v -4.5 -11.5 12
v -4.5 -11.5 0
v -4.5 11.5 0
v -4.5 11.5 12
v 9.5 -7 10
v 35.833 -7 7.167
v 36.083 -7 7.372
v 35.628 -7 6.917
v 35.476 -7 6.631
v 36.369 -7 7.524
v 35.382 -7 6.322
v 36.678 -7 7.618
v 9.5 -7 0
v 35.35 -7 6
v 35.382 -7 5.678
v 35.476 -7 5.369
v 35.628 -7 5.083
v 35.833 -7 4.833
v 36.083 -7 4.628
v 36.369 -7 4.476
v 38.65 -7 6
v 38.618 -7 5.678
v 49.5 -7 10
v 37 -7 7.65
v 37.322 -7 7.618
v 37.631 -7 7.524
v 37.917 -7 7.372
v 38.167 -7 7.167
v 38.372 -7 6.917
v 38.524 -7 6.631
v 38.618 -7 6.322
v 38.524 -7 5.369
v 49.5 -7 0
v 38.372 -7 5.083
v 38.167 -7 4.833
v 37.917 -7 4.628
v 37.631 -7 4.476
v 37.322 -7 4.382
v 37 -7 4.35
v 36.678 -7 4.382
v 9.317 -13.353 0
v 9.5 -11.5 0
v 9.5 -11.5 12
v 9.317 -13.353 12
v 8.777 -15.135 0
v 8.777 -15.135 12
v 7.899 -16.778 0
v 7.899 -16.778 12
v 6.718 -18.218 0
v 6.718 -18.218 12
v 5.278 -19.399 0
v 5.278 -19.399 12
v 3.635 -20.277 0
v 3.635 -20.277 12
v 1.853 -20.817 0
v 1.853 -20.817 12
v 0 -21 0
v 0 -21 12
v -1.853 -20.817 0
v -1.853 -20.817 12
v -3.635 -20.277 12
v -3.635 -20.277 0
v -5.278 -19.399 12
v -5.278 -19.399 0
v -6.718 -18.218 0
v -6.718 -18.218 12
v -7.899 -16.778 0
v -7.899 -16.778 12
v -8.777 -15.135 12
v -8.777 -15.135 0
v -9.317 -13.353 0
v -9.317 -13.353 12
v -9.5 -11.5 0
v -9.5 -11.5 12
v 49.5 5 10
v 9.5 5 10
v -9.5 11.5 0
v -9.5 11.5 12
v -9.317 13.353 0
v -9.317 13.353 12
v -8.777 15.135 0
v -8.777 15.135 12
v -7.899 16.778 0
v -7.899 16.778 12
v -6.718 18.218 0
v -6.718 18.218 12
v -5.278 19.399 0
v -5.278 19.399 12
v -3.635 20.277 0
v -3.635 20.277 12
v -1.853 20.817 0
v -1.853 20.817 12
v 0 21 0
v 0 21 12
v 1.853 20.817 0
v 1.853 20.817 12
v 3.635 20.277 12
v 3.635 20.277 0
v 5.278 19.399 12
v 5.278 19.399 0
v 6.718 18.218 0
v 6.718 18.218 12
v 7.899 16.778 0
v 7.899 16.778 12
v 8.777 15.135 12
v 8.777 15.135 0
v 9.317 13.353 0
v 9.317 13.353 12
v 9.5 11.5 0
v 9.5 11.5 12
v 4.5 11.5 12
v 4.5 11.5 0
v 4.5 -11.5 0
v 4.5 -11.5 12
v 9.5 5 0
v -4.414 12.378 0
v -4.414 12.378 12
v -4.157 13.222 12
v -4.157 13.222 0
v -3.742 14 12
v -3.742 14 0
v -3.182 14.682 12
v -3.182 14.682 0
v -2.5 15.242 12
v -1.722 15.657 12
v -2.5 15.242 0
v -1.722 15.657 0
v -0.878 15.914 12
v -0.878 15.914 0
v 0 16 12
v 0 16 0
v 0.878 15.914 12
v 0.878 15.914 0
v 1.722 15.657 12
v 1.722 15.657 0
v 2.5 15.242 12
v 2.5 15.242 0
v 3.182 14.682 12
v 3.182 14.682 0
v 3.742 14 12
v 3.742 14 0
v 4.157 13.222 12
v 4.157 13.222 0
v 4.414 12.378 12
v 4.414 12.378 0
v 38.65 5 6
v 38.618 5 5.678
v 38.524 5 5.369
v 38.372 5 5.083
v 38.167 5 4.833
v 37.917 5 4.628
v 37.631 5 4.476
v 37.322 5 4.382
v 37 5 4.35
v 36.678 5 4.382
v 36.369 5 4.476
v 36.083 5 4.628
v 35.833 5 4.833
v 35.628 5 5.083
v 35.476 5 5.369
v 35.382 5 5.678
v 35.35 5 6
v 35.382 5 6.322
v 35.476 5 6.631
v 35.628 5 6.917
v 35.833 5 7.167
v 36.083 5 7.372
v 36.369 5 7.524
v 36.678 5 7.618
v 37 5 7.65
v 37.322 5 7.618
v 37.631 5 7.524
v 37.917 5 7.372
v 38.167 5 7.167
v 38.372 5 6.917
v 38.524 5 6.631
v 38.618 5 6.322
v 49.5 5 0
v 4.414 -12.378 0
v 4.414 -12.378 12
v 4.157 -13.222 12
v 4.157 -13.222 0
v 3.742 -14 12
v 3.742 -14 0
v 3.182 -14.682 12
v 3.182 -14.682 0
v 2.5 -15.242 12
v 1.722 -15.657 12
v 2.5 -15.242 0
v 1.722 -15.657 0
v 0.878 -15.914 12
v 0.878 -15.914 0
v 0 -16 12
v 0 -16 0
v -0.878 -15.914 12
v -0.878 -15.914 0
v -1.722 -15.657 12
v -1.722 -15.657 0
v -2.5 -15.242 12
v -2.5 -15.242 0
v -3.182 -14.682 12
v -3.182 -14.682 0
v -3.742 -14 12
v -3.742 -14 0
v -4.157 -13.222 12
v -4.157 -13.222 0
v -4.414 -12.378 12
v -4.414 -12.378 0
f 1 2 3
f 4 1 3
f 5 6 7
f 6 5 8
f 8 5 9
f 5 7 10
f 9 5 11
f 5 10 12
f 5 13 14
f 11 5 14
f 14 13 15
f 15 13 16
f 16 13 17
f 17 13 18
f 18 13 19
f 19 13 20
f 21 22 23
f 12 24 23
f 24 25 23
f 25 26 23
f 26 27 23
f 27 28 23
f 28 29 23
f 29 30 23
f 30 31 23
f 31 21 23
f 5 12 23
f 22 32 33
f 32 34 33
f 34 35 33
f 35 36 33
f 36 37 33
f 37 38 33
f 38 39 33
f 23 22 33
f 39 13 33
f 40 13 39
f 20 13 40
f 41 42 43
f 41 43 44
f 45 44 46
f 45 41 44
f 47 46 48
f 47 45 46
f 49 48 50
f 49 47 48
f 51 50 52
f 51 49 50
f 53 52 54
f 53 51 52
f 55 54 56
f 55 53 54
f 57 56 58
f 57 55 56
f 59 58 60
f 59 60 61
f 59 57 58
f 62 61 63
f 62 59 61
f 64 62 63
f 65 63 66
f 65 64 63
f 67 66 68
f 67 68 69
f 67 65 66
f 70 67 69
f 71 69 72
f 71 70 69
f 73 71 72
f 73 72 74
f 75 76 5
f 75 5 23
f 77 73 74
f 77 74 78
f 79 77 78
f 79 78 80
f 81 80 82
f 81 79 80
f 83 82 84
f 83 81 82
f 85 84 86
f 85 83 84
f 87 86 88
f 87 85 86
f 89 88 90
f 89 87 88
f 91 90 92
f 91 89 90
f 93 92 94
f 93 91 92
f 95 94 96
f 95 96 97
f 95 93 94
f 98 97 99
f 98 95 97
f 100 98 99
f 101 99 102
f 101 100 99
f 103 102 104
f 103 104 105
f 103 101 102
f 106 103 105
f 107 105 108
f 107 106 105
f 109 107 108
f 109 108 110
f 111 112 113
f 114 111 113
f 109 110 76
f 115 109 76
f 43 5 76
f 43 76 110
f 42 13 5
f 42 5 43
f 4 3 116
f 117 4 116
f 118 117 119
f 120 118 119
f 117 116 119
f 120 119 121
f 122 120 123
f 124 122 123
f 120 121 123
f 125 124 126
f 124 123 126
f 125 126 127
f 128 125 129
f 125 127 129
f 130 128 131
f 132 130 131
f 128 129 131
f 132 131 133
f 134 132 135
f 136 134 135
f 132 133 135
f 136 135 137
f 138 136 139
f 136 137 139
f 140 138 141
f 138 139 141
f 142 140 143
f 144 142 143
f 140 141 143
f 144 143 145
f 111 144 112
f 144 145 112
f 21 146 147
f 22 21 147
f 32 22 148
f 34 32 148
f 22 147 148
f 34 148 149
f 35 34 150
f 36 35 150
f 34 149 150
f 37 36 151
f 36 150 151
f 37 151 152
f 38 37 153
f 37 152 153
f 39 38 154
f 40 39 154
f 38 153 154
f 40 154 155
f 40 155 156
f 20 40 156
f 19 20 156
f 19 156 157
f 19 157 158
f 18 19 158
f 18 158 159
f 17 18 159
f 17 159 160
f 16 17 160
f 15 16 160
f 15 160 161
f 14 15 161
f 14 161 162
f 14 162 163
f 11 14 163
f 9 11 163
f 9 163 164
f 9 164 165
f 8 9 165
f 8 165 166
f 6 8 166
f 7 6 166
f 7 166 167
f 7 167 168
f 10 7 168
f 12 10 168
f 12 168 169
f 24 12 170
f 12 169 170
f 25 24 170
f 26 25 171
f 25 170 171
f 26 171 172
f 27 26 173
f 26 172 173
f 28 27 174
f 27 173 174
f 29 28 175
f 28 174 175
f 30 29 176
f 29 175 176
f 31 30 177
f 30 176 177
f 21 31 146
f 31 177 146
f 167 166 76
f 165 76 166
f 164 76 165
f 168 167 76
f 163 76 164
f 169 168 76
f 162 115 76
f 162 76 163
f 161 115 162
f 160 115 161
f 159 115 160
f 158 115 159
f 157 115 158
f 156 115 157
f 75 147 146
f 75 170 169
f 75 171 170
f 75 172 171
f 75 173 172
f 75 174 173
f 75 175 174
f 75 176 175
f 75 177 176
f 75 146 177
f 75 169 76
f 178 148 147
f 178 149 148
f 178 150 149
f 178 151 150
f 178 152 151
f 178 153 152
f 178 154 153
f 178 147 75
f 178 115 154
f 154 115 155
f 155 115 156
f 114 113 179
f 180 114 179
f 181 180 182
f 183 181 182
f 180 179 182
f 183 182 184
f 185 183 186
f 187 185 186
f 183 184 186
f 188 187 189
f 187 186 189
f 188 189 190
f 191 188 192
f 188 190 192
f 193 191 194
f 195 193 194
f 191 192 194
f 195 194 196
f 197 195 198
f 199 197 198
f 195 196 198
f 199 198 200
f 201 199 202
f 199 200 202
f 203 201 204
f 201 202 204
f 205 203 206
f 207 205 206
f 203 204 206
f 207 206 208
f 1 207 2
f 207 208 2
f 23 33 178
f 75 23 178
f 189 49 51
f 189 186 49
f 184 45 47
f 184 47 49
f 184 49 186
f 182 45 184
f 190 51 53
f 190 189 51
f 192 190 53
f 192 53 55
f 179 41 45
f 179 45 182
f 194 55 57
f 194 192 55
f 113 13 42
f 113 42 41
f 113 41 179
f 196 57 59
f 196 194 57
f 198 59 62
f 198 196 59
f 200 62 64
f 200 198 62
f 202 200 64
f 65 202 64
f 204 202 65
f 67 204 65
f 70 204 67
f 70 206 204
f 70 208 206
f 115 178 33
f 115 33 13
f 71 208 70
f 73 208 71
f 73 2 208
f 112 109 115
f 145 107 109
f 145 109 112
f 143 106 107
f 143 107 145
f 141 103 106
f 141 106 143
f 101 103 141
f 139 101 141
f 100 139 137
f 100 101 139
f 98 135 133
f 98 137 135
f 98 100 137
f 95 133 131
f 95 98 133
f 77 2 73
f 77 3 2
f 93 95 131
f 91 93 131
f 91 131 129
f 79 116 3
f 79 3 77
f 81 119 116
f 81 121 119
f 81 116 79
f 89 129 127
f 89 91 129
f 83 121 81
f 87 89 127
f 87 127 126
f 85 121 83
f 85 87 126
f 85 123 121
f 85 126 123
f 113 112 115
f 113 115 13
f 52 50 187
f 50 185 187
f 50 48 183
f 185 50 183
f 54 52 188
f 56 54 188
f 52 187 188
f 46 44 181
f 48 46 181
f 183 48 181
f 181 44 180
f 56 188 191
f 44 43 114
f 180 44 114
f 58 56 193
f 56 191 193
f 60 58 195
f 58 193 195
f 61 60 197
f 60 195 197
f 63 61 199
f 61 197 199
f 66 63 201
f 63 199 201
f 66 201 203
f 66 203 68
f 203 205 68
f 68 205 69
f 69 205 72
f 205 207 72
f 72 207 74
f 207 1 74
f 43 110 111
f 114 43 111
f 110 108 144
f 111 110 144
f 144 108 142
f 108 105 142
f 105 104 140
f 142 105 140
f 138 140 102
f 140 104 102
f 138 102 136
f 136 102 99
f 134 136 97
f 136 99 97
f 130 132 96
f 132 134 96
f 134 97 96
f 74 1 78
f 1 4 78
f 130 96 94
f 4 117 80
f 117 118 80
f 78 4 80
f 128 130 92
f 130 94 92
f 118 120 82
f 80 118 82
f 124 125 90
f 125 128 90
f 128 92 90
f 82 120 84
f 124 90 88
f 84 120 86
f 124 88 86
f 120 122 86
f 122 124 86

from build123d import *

# Parameters (mm, degrees)
BOSS_EXTRUDE1_DEPTH = 12
CUT_EXTRUDE1_DEPTH  = 26.98557292
SKETCH4_W           = 40
SKETCH4_H           = 12
BOSS_EXTRUDE2_DEPTH = 10
M4_TAPPED_HOLE1_D   = 3.3


with BuildPart() as part:
    # Sketch3 → Boss-Extrude1 (new body)
    with BuildSketch(Plane.XY):
        with BuildLine():
            Line((9.5, 11.5), (9.5, -11.5))
            ThreePointArc((9.5, -11.5), (0, -21), (-9.5, -11.5))
            Line((-9.5, -11.5), (-9.5, 11.5))
            ThreePointArc((-9.5, 11.5), (0, 21), (9.5, 11.5))
        make_face()
    extrude(amount=BOSS_EXTRUDE1_DEPTH)

    # Sketch1 → Cut-Extrude1 (cut, through all)
    with BuildSketch(Plane.XY):
        with BuildLine():
            Line((4.5, 11.5), (4.5, -11.5))
            ThreePointArc((4.5, -11.5), (0, -16), (-4.5, -11.5))
            Line((-4.5, -11.5), (-4.5, 11.5))
            ThreePointArc((-4.5, 11.5), (0, 16), (4.5, 11.5))
        make_face()
    extrude(amount=CUT_EXTRUDE1_DEPTH, mode=Mode.SUBTRACT)

    # Sketch4 → Boss-Extrude2 (add)
    with BuildSketch(Plane.XY):
        with Locations((29.5, -1)):
            Rectangle(SKETCH4_W, SKETCH4_H)
    extrude(amount=BOSS_EXTRUDE2_DEPTH)

    # M4 Tapped Hole1 (through all)
    with Locations(Plane(origin=(0, -7, 0), x_dir=(-1, 0, 0), z_dir=(0, -1, 0))):
        with Locations((-37, -6)):
            Hole(M4_TAPPED_HOLE1_D / 2)


solid = part.part
